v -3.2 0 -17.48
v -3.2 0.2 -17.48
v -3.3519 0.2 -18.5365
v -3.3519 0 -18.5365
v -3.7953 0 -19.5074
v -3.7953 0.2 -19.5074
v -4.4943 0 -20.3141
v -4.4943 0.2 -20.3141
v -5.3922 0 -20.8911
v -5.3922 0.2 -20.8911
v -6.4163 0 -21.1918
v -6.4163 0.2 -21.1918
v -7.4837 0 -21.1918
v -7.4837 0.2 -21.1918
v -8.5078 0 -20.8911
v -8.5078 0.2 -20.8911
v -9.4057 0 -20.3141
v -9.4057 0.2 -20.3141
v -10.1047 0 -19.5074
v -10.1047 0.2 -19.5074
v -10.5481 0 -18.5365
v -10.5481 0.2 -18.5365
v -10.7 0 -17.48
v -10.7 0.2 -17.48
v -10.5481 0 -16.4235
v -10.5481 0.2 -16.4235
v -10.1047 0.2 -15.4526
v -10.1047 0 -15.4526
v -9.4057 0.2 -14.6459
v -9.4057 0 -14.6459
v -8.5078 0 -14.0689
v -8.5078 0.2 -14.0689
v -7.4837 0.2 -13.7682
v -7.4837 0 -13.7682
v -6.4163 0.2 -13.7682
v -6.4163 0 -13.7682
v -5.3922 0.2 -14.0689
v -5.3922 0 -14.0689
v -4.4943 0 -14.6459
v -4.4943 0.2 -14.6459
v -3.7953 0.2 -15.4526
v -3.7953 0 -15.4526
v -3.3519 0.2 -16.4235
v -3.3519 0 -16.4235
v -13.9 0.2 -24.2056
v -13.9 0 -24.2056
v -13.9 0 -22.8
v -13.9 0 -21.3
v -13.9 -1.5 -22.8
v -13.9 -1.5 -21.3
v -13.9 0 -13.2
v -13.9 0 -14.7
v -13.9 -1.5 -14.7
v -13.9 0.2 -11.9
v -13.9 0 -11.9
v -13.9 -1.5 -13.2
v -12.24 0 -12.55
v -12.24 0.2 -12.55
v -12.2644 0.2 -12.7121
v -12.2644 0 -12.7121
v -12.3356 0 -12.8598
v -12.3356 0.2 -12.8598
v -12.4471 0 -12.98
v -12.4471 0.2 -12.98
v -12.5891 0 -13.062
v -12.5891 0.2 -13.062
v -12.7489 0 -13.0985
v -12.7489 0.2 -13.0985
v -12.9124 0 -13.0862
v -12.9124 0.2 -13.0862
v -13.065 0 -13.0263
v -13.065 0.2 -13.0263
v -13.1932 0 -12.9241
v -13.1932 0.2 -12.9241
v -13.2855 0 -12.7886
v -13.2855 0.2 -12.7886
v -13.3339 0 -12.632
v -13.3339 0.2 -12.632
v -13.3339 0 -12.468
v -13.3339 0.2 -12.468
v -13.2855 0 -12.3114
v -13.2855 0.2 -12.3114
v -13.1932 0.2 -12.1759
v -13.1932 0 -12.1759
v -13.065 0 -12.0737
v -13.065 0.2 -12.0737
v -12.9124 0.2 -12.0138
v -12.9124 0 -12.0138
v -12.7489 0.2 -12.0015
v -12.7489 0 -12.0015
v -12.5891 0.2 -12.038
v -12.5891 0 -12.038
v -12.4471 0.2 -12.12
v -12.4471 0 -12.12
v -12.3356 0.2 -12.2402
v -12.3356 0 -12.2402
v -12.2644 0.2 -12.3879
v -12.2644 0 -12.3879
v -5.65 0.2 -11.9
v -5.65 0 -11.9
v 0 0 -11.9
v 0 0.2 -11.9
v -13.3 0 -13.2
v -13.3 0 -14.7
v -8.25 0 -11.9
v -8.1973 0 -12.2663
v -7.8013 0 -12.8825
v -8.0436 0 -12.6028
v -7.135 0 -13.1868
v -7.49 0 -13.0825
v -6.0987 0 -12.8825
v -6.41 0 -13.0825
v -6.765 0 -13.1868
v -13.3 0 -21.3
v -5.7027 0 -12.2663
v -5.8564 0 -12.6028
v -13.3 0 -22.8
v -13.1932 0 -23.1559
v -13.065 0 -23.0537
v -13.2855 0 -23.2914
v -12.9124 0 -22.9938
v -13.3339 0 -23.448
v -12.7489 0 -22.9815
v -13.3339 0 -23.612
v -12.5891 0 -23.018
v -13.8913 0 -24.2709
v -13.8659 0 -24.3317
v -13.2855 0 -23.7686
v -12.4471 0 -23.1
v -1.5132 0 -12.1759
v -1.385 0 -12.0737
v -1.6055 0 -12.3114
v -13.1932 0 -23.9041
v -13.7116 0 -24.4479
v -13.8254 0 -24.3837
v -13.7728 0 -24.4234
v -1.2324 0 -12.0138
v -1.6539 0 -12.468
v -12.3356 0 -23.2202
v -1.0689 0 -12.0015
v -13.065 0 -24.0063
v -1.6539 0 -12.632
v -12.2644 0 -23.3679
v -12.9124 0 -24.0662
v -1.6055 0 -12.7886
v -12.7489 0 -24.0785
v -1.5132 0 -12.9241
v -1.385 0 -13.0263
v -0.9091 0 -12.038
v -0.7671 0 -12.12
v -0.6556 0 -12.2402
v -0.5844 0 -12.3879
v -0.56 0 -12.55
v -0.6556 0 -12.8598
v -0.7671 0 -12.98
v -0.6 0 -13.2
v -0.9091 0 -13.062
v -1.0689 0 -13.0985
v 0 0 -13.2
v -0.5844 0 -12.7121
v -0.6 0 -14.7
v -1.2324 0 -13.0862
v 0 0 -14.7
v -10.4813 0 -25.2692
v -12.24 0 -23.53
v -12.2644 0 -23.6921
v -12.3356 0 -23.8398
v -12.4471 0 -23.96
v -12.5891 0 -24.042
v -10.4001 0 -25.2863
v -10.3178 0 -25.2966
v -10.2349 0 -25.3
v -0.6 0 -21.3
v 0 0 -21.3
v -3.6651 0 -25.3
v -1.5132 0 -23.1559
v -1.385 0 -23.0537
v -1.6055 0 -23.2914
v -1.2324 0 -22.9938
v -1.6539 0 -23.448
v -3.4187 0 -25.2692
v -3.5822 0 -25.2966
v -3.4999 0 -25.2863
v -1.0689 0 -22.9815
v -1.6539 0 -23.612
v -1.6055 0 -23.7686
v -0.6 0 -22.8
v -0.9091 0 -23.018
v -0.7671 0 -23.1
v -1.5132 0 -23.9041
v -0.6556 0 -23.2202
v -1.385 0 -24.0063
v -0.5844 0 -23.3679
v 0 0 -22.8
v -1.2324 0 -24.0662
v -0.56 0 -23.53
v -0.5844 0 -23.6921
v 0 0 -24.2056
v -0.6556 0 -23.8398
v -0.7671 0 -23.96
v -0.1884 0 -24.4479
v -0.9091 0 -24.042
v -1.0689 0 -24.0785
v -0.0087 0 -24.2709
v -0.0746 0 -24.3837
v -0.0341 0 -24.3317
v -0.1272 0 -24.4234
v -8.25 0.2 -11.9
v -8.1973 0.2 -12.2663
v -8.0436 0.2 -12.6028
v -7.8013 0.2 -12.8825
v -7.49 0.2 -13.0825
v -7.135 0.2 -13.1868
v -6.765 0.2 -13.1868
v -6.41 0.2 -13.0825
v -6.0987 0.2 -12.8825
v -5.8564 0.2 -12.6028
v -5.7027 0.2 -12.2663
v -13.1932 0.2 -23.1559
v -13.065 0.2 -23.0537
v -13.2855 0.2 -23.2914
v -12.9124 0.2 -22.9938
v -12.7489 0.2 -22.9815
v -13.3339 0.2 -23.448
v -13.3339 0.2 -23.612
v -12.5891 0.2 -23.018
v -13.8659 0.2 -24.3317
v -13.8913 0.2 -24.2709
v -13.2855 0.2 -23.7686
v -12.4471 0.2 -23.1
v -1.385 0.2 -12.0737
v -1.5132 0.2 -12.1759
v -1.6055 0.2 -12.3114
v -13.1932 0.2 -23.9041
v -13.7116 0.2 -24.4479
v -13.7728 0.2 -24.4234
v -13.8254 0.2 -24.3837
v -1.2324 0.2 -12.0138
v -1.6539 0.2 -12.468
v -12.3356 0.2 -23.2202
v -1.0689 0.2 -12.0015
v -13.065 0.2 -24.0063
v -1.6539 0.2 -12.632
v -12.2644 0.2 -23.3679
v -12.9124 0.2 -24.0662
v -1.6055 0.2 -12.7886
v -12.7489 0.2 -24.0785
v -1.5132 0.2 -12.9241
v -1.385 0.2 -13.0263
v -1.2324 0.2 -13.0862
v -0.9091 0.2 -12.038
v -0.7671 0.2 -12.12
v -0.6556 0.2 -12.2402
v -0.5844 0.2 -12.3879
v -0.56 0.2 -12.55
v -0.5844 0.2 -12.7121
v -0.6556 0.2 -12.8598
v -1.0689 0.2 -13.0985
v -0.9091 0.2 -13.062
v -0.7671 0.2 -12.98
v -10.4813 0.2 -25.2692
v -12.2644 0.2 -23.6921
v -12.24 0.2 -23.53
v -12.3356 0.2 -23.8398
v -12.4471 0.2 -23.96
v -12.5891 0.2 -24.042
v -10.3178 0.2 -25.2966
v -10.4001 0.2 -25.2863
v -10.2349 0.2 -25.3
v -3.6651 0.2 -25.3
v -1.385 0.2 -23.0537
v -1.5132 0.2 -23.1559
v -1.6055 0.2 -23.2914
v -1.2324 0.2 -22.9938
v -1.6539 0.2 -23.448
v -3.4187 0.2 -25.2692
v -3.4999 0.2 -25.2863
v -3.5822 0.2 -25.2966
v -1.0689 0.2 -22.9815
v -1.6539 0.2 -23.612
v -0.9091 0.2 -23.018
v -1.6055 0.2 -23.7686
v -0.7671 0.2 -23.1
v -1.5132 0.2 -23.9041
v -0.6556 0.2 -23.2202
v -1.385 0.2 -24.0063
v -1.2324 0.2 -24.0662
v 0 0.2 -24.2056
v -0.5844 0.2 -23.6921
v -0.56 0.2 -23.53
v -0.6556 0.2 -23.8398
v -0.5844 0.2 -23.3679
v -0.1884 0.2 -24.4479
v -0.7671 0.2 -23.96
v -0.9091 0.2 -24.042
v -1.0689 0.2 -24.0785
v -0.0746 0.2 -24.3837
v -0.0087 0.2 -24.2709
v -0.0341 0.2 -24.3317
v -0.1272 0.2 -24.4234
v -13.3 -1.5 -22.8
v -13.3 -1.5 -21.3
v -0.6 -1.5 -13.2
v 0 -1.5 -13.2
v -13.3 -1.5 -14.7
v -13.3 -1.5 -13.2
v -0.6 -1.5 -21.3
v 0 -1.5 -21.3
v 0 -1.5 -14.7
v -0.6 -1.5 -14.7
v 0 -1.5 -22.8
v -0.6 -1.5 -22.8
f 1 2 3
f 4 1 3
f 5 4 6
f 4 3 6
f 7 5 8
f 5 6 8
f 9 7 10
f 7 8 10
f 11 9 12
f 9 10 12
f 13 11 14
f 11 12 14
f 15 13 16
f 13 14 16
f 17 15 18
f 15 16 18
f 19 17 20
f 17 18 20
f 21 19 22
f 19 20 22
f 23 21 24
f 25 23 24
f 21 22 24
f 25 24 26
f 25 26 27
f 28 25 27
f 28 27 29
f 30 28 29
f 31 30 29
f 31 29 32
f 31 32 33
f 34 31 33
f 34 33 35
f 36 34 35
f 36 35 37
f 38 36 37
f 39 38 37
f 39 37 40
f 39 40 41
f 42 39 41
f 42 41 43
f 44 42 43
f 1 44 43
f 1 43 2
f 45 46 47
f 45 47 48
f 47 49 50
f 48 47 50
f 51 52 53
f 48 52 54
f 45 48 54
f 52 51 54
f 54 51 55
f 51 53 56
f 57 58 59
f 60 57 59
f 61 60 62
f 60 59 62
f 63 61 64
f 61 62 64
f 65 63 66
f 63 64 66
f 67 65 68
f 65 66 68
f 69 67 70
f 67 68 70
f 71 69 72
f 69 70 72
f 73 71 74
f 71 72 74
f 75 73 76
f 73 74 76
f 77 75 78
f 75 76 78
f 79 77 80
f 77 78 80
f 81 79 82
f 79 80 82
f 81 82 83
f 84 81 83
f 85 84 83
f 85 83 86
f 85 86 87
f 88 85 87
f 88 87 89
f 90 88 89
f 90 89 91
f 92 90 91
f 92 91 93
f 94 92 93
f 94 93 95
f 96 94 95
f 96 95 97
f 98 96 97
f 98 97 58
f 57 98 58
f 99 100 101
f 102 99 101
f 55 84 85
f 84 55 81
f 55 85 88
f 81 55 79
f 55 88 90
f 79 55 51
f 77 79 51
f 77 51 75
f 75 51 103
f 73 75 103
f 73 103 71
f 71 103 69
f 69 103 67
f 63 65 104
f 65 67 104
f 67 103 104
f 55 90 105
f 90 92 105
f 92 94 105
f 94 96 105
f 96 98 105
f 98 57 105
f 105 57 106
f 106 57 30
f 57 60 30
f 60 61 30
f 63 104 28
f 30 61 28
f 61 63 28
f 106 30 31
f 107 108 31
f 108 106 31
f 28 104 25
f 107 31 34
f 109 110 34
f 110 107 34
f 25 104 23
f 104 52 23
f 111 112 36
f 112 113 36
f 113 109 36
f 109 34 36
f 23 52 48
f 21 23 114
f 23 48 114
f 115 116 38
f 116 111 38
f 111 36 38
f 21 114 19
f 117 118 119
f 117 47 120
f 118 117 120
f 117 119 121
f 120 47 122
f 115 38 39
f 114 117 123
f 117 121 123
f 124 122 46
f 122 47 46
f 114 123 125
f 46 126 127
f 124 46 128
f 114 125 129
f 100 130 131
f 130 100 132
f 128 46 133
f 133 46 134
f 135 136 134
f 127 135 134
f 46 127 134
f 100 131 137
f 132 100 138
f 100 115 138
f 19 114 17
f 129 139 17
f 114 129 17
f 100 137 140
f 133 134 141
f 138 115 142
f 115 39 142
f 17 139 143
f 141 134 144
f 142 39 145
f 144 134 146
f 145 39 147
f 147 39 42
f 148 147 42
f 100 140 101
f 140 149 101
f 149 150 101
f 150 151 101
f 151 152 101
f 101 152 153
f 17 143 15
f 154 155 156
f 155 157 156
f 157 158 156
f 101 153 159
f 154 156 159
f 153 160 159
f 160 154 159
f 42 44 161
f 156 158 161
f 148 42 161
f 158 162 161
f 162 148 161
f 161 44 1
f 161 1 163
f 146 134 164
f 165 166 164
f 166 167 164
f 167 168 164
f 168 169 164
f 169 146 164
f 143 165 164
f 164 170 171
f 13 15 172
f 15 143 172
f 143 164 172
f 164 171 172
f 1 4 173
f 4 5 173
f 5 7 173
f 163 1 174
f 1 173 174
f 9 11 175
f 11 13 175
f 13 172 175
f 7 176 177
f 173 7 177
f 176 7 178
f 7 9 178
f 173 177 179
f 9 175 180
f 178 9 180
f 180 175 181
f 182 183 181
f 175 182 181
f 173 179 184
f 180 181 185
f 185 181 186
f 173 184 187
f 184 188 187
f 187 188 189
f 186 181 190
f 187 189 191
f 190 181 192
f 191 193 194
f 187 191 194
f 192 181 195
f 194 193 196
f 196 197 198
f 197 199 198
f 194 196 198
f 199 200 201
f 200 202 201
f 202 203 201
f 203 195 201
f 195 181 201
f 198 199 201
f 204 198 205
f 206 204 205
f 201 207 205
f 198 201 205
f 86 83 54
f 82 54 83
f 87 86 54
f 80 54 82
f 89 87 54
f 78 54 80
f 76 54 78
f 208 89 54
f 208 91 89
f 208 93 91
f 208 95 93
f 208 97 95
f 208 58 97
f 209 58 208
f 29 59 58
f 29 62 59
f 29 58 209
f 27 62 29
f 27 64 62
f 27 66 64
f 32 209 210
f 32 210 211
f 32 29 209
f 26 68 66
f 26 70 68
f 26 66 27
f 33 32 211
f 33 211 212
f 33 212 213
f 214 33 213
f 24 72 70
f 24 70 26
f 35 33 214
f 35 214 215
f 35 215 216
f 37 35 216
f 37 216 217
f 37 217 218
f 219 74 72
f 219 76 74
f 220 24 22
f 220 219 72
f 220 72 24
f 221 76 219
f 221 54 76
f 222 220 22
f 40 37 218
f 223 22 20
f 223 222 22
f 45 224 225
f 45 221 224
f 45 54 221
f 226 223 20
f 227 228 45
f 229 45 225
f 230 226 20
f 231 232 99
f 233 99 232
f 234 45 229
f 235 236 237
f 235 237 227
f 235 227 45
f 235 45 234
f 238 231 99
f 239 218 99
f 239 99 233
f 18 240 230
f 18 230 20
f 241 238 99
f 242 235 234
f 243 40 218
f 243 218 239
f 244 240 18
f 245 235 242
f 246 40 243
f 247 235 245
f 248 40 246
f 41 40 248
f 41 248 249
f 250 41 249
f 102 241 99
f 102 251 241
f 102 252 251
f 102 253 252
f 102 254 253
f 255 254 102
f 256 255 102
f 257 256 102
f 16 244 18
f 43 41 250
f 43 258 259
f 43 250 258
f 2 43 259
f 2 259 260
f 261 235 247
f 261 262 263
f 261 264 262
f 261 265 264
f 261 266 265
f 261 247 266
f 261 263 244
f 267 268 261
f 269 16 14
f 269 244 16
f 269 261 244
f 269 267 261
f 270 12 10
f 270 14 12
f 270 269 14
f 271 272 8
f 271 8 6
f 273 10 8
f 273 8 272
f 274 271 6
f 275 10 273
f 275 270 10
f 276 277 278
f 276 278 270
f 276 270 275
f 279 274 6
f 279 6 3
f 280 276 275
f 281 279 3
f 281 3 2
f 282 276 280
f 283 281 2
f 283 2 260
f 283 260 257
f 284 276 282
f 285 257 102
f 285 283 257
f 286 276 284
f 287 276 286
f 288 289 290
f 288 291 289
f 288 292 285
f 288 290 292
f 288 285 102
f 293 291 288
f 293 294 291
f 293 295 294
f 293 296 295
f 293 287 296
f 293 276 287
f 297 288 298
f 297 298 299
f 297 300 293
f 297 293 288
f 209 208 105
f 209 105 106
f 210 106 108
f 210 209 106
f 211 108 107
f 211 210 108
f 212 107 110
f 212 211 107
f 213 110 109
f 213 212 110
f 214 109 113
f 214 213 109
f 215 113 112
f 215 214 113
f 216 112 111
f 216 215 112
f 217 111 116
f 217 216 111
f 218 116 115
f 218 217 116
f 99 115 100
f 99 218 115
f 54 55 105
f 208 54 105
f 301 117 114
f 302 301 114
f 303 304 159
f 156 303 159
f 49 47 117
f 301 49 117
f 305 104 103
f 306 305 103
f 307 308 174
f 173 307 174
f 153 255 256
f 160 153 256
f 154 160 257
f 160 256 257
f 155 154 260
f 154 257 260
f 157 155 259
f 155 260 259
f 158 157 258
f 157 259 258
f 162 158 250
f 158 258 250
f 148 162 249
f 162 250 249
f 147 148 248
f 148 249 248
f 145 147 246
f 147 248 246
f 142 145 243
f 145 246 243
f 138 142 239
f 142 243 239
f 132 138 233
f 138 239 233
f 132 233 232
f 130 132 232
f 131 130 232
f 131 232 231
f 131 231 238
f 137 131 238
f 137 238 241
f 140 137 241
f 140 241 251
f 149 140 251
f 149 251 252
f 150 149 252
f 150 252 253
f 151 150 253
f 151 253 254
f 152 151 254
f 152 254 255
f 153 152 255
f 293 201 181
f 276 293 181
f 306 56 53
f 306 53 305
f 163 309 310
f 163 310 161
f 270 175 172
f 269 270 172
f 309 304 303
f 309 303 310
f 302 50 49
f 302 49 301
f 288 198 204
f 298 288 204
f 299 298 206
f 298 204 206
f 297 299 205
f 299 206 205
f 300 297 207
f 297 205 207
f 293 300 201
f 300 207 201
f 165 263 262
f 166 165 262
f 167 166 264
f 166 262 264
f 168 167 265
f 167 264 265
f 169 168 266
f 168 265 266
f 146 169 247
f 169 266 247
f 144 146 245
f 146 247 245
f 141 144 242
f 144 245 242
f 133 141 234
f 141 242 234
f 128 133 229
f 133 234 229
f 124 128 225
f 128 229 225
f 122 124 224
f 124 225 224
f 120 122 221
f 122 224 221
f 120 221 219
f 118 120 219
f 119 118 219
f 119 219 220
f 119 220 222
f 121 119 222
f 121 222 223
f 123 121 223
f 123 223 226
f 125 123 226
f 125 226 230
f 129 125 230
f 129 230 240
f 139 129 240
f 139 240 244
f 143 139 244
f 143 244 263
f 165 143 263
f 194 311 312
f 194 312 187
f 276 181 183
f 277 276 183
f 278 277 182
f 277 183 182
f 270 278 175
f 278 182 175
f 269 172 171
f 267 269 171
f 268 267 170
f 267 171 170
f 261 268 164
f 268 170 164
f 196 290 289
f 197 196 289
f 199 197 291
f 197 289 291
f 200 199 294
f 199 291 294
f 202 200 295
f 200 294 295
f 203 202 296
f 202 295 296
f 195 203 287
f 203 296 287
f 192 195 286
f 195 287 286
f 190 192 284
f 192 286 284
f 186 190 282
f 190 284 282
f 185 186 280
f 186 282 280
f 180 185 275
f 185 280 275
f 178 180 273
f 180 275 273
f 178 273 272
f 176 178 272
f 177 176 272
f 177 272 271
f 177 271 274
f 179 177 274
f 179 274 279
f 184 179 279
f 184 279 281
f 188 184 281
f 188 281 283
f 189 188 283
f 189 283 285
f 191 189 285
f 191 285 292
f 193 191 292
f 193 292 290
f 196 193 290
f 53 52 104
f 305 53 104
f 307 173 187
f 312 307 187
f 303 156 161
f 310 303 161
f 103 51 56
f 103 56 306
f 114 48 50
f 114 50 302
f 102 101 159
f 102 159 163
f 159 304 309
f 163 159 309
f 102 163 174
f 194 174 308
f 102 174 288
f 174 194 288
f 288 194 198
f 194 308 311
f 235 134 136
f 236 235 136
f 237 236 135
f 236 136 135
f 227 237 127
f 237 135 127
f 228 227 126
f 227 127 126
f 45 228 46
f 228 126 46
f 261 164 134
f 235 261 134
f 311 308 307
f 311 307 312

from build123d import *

# Parameters (mm, degrees)
SKETCH1_W           = 13.9
SKETCH1_H           = 0.75
BOSS_EXTRUDE1_DEPTH = 0.2
SKETCH2_R           = 0.55
SKETCH2_R_2         = 3.75
CUT_EXTRUDE1_DEPTH  = 0.3
CUT_EXTRUDE2_DEPTH  = 0.3
SKETCH6_W           = 1.5
SKETCH6_H           = 1.5
BOSS_EXTRUDE2_DEPTH = 0.6
SKETCH7_W           = 0.6
SKETCH7_H           = 1.5
BOSS_EXTRUDE3_DEPTH = 1.5


with BuildPart() as part:
    # Sketch1 → Boss-Extrude1 (new body)
    with BuildSketch(Plane(origin=(0, 0, 0), x_dir=(1, 0, 0), z_dir=(0, 1, 0))):
        with BuildLine():
            Line((-13.9, 12.65), (0, 12.65))
            Line((0, 12.65), (0, 24.20560625))
            ThreePointArc((0, 24.20560625), (-0.052642553, 24.359066467), (-0.188400305, 24.447898383))
            Line((-0.188400305, 24.447898383), (-3.418729556, 25.269168531))
            ThreePointArc((-3.418729556, 25.269168531), (-3.540968219, 25.292262196), (-3.665128335, 25.3))
            Line((-3.665128335, 25.3), (-10.234871665, 25.3))
            ThreePointArc((-10.234871665, 25.3), (-10.359031781, 25.292262196), (-10.481270444, 25.269168531))
            Line((-10.481270444, 25.269168531), (-13.711599695, 24.447898383))
            ThreePointArc((-13.711599695, 24.447898383), (-13.847357447, 24.359066467), (-13.9, 24.20560625))
            Line((-13.9, 24.20560625), (-13.9, 12.65))
        make_face()
        with Locations((-6.95, 12.275)):
            Rectangle(SKETCH1_W, SKETCH1_H)
    extrude(amount=BOSS_EXTRUDE1_DEPTH)

    # Sketch2 → Cut-Extrude1 (cut)
    with BuildSketch(Plane(origin=(0, 0.2, 0), x_dir=(1, 0, 0), z_dir=(0, 1, 0))):
        with Locations((-1.11, 23.53)):
            Circle(SKETCH2_R)
        with Locations((-1.11, 12.55)):
            Circle(SKETCH2_R)
        with Locations((-12.79, 23.53)):
            Circle(SKETCH2_R)
        with Locations((-12.79, 12.55)):
            Circle(SKETCH2_R)
        with Locations((-6.95, 17.48)):
            Circle(SKETCH2_R_2)
    extrude(amount=-CUT_EXTRUDE1_DEPTH, mode=Mode.SUBTRACT)

    # Sketch4 → Cut-Extrude2 (cut)
    with BuildSketch(Plane(origin=(0, 0.2, 0), x_dir=(1, 0, 0), z_dir=(0, 1, 0))):
        with BuildLine():
            Line((-5.65, 11.9), (-8.25, 11.9))
            ThreePointArc((-8.25, 11.9), (-6.95, 13.2), (-5.65, 11.9))
        make_face()
    extrude(amount=-CUT_EXTRUDE2_DEPTH, mode=Mode.SUBTRACT)

    # Sketch6 → Boss-Extrude2 (add)
    with BuildSketch(Plane(origin=(0, 0, 0), x_dir=(0, 0, -1), z_dir=(1, 0, 0))):
        with Locations((22.05, -0.75)):
            Rectangle(SKETCH6_W, SKETCH6_H)
        with Locations((13.95, -0.75)):
            Rectangle(SKETCH6_W, SKETCH6_H)
    extrude(amount=-BOSS_EXTRUDE2_DEPTH)

    # Sketch7 → Boss-Extrude3 (add)
    with BuildSketch(Plane.XZ):
        with Locations((-0.3, -22.05)):
            Rectangle(SKETCH7_W, SKETCH7_H)
        with Locations((-0.3, -13.95)):
            Rectangle(SKETCH7_W, SKETCH7_H)
        with Locations((-13.6, -13.95)):
            Rectangle(SKETCH7_W, SKETCH7_H)
        with Locations((-13.6, -22.05)):
            Rectangle(SKETCH7_W, SKETCH7_H)
    extrude(amount=BOSS_EXTRUDE3_DEPTH)


solid = part.part
